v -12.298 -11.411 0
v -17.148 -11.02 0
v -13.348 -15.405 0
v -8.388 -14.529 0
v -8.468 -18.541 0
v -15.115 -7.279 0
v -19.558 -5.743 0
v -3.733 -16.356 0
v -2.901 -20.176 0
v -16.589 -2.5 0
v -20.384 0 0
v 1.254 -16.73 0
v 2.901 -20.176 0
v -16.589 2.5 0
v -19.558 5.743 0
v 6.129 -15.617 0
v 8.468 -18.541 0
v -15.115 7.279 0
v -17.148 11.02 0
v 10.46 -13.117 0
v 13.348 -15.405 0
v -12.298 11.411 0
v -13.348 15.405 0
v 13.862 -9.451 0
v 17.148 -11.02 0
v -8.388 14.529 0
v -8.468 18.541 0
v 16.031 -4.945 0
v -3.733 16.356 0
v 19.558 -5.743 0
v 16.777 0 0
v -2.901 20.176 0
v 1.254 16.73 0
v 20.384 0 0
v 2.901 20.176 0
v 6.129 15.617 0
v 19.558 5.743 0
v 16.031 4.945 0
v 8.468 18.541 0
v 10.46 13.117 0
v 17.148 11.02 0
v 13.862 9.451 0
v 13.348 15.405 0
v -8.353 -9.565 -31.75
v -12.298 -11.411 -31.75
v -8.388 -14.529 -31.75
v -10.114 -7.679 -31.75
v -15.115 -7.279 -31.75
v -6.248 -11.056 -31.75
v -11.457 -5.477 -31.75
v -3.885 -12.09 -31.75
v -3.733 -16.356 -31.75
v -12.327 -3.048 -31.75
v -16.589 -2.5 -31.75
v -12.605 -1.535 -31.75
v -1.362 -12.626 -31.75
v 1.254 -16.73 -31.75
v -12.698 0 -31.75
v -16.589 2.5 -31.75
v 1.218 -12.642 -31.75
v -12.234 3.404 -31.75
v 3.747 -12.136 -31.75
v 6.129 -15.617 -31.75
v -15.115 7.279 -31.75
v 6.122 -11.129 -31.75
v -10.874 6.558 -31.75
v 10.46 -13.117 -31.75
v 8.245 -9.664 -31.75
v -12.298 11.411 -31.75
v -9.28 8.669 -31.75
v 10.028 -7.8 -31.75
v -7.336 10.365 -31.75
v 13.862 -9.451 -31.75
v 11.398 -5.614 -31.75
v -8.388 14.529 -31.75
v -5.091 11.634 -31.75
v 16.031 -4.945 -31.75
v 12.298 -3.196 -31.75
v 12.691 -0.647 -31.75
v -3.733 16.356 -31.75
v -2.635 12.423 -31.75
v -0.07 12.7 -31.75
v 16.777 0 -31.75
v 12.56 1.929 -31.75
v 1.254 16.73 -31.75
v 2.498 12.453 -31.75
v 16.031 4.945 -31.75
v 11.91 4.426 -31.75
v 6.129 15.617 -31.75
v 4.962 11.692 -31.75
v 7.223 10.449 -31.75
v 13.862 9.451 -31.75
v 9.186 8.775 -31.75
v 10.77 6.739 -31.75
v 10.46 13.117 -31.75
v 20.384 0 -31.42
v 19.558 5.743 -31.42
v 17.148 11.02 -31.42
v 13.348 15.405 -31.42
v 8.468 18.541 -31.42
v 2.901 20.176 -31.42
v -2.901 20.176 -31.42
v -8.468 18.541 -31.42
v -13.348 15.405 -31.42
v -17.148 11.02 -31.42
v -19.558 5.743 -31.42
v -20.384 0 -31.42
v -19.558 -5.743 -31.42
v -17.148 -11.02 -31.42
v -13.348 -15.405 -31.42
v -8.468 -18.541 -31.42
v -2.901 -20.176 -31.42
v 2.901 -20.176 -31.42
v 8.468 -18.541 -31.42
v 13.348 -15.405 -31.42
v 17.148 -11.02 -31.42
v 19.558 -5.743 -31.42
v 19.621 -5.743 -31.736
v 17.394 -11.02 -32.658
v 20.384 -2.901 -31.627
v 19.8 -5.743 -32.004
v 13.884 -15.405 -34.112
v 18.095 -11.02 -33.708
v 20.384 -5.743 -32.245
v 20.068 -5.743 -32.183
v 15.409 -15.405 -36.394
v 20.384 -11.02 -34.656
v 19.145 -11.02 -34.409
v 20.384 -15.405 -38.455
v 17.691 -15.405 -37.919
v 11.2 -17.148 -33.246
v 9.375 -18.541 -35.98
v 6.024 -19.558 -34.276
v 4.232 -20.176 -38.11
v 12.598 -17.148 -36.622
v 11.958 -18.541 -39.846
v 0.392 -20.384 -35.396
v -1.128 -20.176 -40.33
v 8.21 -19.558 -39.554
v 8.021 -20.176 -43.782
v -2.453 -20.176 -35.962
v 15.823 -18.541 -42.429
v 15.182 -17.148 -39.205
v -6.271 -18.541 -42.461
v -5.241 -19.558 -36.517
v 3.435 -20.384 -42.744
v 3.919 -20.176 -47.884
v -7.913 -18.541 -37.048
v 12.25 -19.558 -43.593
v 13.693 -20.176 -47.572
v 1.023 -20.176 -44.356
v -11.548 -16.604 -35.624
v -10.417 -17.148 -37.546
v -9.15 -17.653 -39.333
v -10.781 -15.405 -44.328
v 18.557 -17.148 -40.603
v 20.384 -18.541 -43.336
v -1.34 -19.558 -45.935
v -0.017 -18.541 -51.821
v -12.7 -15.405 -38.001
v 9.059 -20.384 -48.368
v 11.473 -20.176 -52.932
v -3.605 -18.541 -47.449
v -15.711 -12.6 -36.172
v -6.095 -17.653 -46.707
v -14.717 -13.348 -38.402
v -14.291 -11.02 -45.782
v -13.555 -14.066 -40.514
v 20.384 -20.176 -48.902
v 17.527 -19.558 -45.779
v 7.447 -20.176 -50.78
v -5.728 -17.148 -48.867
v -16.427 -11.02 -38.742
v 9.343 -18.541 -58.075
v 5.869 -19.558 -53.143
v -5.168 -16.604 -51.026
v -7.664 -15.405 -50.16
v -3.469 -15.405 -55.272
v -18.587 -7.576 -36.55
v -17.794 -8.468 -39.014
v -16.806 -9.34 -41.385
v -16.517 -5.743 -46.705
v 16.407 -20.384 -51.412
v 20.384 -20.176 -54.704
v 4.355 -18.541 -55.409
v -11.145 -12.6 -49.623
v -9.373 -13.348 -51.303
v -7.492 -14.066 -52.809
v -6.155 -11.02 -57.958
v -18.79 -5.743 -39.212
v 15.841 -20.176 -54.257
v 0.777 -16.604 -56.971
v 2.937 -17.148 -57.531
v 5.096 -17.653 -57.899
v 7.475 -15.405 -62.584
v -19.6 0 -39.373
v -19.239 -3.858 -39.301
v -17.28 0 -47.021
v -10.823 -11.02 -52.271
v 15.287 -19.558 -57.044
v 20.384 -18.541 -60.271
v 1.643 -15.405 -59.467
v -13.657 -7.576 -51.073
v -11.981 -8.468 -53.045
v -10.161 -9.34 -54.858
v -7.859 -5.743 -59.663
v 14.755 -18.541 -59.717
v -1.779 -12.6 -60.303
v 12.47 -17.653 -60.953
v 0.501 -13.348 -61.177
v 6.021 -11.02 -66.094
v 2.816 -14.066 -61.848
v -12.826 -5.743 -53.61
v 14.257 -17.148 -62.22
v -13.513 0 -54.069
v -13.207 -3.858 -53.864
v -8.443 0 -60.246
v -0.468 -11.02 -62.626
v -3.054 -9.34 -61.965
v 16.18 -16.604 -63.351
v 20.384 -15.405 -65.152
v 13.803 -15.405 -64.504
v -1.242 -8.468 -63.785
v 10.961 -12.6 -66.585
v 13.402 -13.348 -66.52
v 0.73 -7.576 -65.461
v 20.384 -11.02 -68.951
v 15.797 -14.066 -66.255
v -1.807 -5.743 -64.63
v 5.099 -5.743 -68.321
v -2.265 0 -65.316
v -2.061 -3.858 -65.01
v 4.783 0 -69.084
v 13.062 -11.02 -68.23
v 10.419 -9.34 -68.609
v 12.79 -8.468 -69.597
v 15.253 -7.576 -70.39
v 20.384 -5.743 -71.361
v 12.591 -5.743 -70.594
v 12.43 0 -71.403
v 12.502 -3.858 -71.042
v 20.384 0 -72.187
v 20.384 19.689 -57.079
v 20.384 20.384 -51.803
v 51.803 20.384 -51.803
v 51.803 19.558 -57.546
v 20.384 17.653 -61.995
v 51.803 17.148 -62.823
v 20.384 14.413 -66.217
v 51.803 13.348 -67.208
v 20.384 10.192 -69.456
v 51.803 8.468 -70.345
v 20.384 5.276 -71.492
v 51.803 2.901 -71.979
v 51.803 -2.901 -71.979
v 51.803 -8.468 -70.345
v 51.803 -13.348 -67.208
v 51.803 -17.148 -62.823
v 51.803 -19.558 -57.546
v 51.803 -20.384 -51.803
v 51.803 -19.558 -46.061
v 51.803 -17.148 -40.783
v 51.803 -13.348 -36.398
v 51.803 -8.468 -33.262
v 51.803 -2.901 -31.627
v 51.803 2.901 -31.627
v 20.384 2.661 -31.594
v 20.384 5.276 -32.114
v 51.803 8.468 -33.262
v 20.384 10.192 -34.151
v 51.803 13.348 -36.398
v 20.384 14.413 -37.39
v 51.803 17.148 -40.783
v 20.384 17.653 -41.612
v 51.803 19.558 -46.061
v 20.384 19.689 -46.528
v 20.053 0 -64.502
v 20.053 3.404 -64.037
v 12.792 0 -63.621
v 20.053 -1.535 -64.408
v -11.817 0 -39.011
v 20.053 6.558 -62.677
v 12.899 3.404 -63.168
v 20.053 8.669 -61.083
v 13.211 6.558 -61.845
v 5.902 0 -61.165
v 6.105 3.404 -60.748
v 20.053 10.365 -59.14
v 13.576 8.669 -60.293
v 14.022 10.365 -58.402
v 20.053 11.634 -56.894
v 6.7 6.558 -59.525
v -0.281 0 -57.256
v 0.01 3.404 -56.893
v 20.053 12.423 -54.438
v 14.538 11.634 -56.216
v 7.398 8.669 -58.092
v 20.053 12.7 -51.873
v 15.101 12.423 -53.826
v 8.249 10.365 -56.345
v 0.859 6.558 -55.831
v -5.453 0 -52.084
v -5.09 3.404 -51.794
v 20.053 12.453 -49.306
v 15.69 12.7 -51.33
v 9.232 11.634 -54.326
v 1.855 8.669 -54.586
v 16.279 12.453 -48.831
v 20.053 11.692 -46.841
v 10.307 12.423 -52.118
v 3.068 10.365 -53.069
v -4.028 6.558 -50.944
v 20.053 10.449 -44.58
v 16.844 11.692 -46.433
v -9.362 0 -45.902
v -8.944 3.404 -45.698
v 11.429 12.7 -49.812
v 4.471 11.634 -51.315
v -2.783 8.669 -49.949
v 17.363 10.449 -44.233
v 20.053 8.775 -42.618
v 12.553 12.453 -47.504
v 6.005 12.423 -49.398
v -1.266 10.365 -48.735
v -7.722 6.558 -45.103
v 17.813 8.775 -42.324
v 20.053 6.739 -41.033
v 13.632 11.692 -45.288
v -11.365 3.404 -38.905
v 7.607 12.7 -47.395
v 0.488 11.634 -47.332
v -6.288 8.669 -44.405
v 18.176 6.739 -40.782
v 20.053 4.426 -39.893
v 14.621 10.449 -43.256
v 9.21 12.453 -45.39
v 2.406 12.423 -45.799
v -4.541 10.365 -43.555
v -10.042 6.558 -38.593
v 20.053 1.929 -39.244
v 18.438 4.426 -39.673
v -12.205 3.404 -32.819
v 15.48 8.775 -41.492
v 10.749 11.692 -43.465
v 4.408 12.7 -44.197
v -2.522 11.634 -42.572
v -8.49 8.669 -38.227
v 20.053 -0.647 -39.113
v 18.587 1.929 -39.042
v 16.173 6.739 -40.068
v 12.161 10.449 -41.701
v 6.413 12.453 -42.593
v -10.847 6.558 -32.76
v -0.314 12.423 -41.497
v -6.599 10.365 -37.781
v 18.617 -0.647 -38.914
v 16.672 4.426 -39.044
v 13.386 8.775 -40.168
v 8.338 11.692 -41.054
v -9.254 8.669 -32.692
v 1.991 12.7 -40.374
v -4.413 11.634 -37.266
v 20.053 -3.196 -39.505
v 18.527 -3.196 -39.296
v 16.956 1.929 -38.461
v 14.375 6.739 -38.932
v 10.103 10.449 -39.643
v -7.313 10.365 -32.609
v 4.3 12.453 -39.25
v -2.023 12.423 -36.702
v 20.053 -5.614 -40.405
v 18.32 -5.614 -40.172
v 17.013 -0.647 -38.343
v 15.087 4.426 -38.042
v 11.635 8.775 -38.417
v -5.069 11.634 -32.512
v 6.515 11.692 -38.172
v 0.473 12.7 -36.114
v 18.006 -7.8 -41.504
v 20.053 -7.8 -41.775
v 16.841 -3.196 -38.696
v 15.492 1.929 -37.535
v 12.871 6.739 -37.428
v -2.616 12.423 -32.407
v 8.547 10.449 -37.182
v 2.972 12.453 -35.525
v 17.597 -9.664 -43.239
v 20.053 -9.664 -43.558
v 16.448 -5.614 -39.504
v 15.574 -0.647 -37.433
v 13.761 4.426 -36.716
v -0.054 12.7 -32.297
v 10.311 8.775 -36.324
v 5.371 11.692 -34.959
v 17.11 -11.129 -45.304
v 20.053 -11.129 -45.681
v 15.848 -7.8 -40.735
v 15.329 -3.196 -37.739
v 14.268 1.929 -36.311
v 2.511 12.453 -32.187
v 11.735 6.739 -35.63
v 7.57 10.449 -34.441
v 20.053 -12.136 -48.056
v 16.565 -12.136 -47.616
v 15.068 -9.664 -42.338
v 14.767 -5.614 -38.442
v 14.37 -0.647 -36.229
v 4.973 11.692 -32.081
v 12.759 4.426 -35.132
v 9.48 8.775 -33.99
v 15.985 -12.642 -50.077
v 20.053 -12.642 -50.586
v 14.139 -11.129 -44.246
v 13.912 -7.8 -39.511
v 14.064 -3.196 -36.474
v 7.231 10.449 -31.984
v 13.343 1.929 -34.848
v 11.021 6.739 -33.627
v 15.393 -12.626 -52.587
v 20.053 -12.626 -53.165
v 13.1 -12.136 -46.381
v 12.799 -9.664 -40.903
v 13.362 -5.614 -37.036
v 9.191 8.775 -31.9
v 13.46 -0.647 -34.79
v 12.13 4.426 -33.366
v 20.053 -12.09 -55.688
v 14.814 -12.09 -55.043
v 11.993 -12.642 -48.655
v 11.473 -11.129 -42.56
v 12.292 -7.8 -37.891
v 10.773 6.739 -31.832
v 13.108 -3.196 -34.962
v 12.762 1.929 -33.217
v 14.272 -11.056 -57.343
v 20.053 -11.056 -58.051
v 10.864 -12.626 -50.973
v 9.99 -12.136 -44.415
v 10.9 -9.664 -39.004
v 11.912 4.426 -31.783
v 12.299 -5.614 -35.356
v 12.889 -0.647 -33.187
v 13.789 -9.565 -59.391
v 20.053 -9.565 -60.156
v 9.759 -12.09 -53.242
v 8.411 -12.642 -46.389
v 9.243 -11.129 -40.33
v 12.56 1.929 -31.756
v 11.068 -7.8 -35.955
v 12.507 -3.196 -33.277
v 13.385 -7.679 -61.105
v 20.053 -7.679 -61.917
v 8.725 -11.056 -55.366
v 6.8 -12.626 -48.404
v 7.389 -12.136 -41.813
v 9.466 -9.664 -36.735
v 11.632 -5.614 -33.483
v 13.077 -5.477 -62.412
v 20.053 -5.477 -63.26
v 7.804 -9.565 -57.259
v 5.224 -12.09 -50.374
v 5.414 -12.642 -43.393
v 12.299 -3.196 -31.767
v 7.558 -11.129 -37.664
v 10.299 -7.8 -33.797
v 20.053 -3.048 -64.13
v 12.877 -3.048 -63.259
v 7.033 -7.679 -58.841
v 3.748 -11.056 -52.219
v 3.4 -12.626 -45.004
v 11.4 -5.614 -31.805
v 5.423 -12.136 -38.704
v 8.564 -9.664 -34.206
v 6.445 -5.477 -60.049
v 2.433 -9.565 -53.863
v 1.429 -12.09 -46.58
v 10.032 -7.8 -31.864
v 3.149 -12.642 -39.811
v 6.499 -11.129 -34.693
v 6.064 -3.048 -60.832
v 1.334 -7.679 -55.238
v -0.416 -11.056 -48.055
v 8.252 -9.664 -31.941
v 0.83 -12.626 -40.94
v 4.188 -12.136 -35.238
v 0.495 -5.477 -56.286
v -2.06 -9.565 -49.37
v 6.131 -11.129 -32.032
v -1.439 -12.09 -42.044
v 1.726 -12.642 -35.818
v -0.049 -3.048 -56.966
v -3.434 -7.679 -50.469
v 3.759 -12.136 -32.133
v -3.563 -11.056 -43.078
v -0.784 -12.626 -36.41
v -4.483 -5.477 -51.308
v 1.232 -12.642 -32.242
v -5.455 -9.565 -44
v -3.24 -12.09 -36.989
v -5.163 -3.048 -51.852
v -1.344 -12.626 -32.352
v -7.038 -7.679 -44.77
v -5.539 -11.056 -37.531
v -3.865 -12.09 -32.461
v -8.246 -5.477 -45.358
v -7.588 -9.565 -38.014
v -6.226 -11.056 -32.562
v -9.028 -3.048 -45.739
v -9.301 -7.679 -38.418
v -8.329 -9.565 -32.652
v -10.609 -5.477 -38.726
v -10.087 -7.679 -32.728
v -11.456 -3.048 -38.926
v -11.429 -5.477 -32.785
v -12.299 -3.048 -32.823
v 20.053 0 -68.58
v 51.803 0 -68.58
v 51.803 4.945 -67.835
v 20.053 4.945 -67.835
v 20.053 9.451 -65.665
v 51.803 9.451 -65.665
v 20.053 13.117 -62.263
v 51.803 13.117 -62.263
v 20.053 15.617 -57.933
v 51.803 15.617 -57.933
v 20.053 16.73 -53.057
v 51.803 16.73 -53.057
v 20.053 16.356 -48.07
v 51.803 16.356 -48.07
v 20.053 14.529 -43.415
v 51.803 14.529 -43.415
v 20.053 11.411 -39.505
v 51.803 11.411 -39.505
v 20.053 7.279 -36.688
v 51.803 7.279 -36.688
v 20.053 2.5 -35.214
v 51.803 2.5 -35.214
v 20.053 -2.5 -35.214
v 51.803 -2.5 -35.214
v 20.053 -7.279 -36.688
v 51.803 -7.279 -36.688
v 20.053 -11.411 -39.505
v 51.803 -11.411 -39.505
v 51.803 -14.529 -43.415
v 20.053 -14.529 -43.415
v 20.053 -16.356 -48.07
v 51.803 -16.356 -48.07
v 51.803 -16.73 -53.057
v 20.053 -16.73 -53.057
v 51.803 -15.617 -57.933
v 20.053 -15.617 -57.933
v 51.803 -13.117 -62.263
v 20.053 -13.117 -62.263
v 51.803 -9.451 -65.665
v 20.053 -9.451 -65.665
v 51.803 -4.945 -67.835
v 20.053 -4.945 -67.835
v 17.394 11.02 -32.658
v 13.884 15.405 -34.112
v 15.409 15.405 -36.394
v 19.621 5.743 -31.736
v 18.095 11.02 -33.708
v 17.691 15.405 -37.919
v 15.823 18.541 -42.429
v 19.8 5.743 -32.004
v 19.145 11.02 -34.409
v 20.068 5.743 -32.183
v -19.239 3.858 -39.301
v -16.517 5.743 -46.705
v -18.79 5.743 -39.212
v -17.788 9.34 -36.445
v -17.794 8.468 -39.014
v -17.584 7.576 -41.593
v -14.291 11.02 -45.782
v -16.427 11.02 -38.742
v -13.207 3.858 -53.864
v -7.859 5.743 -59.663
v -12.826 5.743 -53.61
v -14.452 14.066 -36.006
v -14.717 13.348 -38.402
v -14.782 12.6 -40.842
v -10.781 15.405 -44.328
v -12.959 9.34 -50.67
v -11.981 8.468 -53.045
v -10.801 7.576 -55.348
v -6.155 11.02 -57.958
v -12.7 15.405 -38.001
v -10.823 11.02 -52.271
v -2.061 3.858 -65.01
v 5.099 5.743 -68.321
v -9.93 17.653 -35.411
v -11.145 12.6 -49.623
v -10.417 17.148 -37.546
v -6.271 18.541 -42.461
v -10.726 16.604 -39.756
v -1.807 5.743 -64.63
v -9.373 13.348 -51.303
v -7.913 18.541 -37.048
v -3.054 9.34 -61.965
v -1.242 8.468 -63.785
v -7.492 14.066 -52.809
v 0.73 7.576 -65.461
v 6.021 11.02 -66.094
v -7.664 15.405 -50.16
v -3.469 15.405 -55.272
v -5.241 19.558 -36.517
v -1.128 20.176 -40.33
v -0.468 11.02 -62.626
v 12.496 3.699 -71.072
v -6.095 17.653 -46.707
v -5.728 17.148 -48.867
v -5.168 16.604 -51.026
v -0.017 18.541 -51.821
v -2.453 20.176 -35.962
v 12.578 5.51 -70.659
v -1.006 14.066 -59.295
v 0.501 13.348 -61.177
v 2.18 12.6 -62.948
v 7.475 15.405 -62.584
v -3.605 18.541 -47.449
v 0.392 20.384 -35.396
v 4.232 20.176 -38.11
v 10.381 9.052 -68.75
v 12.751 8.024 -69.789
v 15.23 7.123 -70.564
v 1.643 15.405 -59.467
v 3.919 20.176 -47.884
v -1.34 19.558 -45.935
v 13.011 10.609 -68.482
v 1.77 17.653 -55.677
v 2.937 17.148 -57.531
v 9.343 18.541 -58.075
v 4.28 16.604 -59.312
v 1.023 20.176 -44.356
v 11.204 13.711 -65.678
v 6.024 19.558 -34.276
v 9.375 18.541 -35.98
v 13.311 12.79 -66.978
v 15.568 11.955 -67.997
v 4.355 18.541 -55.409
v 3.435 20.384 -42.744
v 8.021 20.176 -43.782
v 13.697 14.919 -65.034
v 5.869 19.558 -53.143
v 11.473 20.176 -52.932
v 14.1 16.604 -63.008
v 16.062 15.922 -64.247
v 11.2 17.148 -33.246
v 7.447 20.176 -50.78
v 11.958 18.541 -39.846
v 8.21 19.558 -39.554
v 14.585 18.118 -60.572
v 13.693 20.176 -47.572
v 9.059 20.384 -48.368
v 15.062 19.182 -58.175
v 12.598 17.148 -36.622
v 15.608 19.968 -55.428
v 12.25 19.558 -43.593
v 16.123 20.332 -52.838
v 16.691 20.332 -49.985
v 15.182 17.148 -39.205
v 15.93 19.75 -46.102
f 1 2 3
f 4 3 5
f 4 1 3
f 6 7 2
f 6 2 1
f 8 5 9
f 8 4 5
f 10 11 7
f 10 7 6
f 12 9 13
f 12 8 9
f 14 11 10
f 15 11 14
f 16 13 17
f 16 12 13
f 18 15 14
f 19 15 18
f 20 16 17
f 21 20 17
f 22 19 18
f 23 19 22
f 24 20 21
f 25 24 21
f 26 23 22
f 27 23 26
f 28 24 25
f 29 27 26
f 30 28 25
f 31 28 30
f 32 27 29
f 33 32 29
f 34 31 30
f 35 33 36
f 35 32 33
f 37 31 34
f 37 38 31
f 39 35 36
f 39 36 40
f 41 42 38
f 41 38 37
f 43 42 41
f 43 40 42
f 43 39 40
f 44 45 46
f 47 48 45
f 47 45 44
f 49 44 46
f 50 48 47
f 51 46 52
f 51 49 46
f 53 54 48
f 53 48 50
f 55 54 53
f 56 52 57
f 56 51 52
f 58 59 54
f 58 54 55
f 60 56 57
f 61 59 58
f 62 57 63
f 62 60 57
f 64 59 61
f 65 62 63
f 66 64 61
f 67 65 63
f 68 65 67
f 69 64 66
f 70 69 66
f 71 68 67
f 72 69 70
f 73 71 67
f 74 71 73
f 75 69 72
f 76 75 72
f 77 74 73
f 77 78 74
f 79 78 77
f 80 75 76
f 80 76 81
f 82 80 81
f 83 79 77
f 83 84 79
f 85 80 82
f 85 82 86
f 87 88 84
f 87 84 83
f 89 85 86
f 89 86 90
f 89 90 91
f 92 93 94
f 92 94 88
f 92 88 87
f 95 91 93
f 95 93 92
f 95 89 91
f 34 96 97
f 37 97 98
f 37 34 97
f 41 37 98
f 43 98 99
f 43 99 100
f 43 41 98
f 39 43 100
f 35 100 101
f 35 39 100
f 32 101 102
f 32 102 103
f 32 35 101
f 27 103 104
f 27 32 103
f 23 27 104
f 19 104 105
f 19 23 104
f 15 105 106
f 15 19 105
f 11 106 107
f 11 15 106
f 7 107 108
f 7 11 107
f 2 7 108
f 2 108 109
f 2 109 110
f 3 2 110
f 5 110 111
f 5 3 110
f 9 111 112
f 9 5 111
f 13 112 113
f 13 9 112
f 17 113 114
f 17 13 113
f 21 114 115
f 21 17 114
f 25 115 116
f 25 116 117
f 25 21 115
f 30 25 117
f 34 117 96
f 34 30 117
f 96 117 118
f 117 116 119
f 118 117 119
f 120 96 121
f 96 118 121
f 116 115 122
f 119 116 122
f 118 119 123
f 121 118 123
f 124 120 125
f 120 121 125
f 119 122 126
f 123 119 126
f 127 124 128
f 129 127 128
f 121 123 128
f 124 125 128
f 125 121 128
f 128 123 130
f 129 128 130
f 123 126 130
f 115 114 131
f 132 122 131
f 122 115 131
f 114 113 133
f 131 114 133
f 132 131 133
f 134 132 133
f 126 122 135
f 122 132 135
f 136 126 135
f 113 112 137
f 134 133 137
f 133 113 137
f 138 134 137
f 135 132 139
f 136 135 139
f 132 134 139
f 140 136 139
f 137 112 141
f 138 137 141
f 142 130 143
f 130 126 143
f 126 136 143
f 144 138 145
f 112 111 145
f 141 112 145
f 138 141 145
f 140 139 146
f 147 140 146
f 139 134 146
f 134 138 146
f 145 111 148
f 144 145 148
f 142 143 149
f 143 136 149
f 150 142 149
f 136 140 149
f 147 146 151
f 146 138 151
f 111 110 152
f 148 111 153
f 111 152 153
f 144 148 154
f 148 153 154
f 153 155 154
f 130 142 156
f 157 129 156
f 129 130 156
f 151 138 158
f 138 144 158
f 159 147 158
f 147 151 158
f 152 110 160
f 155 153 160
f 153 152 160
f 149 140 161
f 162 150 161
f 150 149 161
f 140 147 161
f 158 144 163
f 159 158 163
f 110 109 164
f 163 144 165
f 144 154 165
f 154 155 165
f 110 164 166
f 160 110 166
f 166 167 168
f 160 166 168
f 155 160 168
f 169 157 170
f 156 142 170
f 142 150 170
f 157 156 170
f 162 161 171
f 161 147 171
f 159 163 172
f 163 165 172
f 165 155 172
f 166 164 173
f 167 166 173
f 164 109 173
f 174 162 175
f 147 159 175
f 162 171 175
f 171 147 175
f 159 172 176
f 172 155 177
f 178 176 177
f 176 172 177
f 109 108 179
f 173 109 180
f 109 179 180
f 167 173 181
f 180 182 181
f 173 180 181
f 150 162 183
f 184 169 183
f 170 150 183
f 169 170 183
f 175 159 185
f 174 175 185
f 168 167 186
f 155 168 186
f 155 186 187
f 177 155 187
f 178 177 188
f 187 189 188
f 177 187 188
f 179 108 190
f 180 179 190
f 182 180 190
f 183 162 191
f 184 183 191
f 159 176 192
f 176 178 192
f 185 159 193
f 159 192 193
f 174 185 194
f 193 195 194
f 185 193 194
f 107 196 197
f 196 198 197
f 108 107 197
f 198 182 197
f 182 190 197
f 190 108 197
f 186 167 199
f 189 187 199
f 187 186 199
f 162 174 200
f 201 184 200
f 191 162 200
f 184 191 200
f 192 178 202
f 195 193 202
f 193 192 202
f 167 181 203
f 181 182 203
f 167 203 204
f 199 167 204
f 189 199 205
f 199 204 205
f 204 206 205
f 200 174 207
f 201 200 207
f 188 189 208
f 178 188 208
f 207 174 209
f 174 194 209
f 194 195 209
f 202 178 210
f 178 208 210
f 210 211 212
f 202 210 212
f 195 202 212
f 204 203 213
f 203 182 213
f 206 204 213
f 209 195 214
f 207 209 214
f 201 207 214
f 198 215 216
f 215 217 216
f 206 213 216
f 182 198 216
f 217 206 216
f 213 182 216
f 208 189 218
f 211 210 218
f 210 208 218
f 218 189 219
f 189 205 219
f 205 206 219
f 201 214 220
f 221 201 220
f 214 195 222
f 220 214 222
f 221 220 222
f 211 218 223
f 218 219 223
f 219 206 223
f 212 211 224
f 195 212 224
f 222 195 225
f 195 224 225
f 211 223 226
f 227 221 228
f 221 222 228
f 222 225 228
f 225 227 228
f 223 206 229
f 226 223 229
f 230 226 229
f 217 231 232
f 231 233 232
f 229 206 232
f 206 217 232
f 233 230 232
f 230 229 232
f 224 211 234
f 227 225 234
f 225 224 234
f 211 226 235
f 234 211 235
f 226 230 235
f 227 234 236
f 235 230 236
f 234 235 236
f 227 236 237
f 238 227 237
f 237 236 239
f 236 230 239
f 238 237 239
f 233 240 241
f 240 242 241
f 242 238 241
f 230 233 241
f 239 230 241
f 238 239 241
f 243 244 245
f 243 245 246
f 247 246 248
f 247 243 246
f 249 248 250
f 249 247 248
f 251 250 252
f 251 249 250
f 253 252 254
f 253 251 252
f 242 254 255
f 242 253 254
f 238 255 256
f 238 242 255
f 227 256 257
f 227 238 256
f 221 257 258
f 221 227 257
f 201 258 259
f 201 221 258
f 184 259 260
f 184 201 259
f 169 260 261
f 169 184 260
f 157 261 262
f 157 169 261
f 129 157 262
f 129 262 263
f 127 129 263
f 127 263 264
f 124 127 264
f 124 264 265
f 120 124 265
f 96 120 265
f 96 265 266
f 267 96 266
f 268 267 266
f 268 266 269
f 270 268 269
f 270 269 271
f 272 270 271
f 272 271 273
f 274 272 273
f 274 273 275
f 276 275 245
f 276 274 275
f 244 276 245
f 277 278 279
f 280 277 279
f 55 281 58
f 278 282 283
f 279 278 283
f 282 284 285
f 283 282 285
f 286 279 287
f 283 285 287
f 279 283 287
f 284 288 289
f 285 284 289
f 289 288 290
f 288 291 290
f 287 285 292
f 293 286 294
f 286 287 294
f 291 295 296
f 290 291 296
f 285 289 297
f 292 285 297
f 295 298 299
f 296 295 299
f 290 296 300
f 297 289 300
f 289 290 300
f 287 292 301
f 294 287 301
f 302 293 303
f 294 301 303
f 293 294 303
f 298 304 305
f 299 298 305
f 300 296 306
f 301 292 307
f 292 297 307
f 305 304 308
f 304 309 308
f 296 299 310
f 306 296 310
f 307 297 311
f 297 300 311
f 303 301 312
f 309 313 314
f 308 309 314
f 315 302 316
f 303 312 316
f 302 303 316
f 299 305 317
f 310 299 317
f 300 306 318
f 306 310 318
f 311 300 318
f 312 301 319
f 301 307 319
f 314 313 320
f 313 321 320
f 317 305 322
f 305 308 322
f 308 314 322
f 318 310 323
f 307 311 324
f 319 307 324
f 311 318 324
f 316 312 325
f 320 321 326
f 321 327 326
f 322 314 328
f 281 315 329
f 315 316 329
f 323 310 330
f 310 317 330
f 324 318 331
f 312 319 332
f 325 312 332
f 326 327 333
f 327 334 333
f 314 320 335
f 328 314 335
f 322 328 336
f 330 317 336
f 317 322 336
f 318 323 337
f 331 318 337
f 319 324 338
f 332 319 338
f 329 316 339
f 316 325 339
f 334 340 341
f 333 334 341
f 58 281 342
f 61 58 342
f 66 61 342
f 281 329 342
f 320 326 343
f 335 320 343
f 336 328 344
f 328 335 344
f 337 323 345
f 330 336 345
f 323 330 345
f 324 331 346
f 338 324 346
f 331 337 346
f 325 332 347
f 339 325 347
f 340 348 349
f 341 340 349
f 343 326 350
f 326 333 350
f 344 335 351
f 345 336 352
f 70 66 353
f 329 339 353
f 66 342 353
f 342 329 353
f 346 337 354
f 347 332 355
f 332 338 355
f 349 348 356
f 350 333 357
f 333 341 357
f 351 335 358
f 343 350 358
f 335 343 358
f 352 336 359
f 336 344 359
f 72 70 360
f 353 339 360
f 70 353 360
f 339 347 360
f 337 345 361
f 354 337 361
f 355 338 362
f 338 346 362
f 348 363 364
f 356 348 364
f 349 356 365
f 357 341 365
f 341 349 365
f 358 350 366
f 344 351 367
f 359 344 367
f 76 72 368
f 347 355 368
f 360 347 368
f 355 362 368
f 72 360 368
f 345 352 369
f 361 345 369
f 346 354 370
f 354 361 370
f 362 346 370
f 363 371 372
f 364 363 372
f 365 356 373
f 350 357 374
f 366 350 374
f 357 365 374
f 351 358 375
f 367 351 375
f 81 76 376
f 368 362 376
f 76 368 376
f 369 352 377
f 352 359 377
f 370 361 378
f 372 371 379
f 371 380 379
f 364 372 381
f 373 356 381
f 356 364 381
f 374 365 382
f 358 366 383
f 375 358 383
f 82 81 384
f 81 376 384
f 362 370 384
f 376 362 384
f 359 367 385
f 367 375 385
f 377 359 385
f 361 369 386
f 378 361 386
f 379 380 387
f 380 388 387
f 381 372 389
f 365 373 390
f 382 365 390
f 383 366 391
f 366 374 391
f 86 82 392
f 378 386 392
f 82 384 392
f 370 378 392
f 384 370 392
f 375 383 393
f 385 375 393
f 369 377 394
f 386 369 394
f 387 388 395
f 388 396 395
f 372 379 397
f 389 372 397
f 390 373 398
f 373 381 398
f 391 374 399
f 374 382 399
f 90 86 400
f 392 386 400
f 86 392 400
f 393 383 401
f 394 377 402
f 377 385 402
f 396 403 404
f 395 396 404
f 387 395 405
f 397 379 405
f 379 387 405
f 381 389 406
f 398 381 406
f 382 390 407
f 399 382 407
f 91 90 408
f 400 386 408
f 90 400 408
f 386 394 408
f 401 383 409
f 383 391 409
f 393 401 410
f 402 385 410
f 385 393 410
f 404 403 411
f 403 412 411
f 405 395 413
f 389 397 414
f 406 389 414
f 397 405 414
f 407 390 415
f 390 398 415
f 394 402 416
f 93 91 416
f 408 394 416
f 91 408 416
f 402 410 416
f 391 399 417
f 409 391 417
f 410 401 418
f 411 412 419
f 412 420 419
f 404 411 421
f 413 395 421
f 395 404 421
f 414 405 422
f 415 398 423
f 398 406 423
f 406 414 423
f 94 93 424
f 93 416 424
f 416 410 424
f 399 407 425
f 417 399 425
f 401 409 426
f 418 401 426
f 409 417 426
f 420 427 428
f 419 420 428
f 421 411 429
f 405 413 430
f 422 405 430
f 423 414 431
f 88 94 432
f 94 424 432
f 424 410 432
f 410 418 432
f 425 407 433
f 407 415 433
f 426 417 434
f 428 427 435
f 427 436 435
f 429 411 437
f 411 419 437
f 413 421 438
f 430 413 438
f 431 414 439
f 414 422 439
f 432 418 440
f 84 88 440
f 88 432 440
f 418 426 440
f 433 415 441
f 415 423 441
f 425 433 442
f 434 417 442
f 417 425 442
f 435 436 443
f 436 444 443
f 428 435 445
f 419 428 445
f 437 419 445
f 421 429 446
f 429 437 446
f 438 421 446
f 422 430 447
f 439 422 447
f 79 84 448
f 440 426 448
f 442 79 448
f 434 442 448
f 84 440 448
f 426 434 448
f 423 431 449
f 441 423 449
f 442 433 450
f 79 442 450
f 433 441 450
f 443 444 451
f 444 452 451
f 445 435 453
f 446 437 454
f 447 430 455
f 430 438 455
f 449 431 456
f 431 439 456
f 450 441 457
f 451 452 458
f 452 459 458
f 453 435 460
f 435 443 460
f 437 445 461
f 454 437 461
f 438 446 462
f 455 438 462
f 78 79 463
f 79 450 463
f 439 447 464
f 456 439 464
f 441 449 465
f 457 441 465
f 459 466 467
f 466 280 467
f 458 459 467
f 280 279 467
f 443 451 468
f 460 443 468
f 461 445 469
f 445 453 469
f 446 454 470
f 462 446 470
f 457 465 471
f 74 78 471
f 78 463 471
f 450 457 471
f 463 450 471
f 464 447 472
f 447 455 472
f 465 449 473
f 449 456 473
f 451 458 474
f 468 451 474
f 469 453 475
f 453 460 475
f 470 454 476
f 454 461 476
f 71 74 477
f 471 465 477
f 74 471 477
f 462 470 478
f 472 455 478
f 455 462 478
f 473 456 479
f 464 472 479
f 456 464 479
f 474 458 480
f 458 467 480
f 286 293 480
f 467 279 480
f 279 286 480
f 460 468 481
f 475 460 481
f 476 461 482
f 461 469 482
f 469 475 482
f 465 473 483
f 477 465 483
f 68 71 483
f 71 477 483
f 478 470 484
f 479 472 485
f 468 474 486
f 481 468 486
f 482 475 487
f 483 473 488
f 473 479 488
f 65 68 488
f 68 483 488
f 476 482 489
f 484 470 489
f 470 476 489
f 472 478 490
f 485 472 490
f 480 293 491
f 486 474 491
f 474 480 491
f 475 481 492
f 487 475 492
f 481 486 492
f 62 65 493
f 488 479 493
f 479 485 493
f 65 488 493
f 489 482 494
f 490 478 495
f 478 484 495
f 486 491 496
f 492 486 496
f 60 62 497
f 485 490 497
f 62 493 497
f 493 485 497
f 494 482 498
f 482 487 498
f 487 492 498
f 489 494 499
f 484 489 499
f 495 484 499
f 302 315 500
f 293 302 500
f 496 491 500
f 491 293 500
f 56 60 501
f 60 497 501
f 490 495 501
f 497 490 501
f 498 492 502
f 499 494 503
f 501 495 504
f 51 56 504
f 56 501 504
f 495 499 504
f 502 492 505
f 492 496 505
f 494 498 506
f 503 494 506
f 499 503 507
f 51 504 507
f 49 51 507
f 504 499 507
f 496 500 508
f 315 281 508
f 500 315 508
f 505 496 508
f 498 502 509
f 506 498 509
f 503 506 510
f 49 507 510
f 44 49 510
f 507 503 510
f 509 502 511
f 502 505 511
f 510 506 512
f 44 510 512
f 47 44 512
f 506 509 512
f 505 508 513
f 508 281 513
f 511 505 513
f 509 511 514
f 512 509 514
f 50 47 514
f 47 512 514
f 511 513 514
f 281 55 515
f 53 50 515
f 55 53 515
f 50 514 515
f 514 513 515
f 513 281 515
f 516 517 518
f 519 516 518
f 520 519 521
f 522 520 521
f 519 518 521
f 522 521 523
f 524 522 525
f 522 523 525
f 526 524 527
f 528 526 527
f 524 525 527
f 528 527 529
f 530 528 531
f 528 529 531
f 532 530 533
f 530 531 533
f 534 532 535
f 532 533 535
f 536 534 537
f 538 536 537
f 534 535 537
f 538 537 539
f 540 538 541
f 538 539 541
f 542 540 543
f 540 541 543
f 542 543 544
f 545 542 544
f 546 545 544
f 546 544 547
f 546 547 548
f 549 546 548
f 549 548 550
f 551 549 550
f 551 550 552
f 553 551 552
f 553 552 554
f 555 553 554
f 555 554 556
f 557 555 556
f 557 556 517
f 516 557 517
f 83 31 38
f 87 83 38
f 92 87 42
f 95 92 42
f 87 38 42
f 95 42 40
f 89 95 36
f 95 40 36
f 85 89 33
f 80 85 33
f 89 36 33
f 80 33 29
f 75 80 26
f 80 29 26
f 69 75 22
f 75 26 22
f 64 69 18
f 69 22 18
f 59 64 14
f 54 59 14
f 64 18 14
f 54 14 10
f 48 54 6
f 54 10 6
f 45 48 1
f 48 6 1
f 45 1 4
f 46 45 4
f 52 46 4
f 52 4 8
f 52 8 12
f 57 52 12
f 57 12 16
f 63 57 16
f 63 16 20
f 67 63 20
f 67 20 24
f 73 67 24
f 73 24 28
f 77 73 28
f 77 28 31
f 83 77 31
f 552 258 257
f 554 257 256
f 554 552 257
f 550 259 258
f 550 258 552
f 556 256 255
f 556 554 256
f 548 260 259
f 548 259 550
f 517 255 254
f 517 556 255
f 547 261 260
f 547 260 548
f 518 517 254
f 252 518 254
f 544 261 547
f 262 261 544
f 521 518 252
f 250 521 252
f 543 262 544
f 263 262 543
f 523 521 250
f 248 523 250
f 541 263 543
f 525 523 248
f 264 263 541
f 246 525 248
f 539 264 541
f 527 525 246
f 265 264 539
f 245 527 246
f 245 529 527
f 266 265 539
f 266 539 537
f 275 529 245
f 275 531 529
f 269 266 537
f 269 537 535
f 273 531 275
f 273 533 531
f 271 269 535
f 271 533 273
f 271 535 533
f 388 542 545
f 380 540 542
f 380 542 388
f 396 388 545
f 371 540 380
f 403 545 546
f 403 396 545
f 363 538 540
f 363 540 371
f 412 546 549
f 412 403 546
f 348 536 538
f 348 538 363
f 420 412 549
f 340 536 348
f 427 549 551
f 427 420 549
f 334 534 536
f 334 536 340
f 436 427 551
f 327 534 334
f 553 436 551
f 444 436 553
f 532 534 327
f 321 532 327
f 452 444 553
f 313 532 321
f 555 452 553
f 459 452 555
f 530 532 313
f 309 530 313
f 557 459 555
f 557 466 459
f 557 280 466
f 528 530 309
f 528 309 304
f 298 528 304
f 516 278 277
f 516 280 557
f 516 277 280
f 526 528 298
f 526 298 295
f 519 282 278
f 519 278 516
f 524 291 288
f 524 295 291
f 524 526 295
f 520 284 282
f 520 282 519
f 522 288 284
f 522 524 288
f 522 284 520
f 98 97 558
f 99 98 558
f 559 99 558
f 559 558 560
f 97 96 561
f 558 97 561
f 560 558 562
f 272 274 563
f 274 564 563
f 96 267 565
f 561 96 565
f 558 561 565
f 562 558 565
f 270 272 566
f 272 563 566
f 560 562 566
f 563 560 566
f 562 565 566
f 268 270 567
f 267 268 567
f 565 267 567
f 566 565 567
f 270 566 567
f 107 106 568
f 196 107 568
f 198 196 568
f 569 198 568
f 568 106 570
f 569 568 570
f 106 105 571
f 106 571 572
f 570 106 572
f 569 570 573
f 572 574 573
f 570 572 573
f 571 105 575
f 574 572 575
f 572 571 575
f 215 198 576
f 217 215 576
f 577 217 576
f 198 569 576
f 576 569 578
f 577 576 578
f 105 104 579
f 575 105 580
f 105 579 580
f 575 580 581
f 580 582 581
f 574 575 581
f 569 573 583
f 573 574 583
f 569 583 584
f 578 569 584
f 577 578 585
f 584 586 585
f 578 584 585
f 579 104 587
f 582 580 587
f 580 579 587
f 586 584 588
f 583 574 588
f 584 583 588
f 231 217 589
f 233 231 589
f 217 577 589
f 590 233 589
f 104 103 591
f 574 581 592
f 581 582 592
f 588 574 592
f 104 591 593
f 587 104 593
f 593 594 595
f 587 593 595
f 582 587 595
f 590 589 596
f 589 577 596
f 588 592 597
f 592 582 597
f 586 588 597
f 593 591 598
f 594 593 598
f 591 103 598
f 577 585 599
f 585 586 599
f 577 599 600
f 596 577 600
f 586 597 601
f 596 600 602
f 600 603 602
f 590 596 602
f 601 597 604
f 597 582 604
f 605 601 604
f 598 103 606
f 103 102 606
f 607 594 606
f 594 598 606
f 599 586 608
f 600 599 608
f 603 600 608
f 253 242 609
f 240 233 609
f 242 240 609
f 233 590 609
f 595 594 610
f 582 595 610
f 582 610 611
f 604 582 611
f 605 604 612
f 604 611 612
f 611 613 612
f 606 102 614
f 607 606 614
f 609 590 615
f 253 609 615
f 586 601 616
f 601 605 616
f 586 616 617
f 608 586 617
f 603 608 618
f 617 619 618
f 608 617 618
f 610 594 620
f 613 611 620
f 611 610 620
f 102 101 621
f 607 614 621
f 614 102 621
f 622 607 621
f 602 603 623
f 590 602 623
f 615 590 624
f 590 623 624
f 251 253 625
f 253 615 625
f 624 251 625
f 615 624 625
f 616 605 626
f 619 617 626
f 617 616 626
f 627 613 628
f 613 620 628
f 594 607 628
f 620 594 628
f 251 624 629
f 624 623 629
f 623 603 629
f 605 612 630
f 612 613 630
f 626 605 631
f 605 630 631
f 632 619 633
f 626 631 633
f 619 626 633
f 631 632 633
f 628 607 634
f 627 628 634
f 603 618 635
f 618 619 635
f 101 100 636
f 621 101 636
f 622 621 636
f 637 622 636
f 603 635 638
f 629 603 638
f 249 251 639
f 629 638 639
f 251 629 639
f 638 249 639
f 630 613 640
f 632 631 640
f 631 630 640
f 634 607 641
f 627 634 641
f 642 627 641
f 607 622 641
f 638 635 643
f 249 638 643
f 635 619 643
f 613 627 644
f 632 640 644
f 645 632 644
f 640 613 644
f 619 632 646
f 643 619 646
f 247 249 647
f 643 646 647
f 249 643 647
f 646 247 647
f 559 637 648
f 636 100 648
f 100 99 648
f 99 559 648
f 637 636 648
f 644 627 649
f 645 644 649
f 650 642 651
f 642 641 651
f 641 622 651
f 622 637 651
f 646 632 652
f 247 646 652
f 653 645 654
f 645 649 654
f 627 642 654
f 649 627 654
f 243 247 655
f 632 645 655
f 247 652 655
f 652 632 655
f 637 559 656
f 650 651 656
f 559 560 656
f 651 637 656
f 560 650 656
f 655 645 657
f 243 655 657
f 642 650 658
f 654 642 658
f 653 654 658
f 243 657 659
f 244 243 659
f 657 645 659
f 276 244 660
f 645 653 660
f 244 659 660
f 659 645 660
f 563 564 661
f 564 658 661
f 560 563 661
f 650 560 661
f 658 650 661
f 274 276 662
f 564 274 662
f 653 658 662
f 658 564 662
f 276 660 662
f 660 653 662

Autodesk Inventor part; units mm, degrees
sketch "Sketch1" plane through (0, 0, 0) normal (0, 0, 1) x (1, 0, 0)
  circle A0 centre (0, 0) radius 20.3835
  dimension "d0" = 40.767
extrude "Extrusion1" add sketch "Sketch1" against normal blind 31.4198
sketch "Sketch2" plane through (0, 0, -31.4198) normal (0, 0, -1) x (-1, 0, 0)
  circle A0 centre (0, 0) radius 20.3835 projected
  line L0 (-20.3835, 0) -> (-20.3835, 24.6473)
ref_plane "Work Plane1" through (20.3835, 0, -31.4198) normal (1, 0, 0) x (0, 1, 0)
sketch "Sketch3" plane through (20.3835, 0, -31.4198) normal (1, 0, 0) x (0, 1, 0)
  line L0 (-20.3835, 0) -> (20.3835, 0) projected
  line L1 (0, 0) -> (0, -20.3835)
  circle A0 centre (0, -20.3835) radius 20.3835
  point P0 (0, 31.4198)
  dimension "d4" = 20.3835
extrude "Extrusion2" add sketch "Sketch3" along normal blind 31.4198
sketch "Sketch4" plane through (0, 0, 0) normal (0, 0, 1) x (1, 0, 0)
  circle A0 centre (0, 0) radius 16.7767
  dimension "d7" = 33.5534
sketch "Sketch5" plane through (51.8033, 0, -51.8033) normal (1, 0, 0) x (0, 0, -1)
  circle A0 centre (0, 0) radius 16.7767
  point P0 (-51.8033, 0)
  dimension "d8" = 33.5534
ref_plane "Work Plane2" through (0, 0, -31.4198) normal (0, 0, -1) x (-1, 0, 0)
ref_plane "Work Plane3" through (20.3835, 0, -31.4198) normal (-1, 0, 0) x (0, 0, 1)
revolve "Revolution1" add sketch "Sketch2" angle 90 about axis through (20.3835, 0, -31.4198) along (0, -1, 0)
extrude "Extrusion3" cut sketch "Sketch4" against normal blind 31.75
sketch "Sketch6" plane through (0, 0, -31.4198) normal (0, 0, -1) x (-1, 0, 0)
  circle A0 centre (0, 0) radius 12.7
  line L0 (-20.3835, -28.5369) -> (-20.3835, 28.5369) projected
  dimension "d14" = 25.4
revolve "Revolution2" cut sketch "Sketch6" angle 90 about axis through (20.3835, 0, -31.4198) along (0, -1, 0)
extrude "Extrusion4" cut sketch "Sketch5" against normal blind 31.75
properties part number "90 Elbow 1 Inch"
